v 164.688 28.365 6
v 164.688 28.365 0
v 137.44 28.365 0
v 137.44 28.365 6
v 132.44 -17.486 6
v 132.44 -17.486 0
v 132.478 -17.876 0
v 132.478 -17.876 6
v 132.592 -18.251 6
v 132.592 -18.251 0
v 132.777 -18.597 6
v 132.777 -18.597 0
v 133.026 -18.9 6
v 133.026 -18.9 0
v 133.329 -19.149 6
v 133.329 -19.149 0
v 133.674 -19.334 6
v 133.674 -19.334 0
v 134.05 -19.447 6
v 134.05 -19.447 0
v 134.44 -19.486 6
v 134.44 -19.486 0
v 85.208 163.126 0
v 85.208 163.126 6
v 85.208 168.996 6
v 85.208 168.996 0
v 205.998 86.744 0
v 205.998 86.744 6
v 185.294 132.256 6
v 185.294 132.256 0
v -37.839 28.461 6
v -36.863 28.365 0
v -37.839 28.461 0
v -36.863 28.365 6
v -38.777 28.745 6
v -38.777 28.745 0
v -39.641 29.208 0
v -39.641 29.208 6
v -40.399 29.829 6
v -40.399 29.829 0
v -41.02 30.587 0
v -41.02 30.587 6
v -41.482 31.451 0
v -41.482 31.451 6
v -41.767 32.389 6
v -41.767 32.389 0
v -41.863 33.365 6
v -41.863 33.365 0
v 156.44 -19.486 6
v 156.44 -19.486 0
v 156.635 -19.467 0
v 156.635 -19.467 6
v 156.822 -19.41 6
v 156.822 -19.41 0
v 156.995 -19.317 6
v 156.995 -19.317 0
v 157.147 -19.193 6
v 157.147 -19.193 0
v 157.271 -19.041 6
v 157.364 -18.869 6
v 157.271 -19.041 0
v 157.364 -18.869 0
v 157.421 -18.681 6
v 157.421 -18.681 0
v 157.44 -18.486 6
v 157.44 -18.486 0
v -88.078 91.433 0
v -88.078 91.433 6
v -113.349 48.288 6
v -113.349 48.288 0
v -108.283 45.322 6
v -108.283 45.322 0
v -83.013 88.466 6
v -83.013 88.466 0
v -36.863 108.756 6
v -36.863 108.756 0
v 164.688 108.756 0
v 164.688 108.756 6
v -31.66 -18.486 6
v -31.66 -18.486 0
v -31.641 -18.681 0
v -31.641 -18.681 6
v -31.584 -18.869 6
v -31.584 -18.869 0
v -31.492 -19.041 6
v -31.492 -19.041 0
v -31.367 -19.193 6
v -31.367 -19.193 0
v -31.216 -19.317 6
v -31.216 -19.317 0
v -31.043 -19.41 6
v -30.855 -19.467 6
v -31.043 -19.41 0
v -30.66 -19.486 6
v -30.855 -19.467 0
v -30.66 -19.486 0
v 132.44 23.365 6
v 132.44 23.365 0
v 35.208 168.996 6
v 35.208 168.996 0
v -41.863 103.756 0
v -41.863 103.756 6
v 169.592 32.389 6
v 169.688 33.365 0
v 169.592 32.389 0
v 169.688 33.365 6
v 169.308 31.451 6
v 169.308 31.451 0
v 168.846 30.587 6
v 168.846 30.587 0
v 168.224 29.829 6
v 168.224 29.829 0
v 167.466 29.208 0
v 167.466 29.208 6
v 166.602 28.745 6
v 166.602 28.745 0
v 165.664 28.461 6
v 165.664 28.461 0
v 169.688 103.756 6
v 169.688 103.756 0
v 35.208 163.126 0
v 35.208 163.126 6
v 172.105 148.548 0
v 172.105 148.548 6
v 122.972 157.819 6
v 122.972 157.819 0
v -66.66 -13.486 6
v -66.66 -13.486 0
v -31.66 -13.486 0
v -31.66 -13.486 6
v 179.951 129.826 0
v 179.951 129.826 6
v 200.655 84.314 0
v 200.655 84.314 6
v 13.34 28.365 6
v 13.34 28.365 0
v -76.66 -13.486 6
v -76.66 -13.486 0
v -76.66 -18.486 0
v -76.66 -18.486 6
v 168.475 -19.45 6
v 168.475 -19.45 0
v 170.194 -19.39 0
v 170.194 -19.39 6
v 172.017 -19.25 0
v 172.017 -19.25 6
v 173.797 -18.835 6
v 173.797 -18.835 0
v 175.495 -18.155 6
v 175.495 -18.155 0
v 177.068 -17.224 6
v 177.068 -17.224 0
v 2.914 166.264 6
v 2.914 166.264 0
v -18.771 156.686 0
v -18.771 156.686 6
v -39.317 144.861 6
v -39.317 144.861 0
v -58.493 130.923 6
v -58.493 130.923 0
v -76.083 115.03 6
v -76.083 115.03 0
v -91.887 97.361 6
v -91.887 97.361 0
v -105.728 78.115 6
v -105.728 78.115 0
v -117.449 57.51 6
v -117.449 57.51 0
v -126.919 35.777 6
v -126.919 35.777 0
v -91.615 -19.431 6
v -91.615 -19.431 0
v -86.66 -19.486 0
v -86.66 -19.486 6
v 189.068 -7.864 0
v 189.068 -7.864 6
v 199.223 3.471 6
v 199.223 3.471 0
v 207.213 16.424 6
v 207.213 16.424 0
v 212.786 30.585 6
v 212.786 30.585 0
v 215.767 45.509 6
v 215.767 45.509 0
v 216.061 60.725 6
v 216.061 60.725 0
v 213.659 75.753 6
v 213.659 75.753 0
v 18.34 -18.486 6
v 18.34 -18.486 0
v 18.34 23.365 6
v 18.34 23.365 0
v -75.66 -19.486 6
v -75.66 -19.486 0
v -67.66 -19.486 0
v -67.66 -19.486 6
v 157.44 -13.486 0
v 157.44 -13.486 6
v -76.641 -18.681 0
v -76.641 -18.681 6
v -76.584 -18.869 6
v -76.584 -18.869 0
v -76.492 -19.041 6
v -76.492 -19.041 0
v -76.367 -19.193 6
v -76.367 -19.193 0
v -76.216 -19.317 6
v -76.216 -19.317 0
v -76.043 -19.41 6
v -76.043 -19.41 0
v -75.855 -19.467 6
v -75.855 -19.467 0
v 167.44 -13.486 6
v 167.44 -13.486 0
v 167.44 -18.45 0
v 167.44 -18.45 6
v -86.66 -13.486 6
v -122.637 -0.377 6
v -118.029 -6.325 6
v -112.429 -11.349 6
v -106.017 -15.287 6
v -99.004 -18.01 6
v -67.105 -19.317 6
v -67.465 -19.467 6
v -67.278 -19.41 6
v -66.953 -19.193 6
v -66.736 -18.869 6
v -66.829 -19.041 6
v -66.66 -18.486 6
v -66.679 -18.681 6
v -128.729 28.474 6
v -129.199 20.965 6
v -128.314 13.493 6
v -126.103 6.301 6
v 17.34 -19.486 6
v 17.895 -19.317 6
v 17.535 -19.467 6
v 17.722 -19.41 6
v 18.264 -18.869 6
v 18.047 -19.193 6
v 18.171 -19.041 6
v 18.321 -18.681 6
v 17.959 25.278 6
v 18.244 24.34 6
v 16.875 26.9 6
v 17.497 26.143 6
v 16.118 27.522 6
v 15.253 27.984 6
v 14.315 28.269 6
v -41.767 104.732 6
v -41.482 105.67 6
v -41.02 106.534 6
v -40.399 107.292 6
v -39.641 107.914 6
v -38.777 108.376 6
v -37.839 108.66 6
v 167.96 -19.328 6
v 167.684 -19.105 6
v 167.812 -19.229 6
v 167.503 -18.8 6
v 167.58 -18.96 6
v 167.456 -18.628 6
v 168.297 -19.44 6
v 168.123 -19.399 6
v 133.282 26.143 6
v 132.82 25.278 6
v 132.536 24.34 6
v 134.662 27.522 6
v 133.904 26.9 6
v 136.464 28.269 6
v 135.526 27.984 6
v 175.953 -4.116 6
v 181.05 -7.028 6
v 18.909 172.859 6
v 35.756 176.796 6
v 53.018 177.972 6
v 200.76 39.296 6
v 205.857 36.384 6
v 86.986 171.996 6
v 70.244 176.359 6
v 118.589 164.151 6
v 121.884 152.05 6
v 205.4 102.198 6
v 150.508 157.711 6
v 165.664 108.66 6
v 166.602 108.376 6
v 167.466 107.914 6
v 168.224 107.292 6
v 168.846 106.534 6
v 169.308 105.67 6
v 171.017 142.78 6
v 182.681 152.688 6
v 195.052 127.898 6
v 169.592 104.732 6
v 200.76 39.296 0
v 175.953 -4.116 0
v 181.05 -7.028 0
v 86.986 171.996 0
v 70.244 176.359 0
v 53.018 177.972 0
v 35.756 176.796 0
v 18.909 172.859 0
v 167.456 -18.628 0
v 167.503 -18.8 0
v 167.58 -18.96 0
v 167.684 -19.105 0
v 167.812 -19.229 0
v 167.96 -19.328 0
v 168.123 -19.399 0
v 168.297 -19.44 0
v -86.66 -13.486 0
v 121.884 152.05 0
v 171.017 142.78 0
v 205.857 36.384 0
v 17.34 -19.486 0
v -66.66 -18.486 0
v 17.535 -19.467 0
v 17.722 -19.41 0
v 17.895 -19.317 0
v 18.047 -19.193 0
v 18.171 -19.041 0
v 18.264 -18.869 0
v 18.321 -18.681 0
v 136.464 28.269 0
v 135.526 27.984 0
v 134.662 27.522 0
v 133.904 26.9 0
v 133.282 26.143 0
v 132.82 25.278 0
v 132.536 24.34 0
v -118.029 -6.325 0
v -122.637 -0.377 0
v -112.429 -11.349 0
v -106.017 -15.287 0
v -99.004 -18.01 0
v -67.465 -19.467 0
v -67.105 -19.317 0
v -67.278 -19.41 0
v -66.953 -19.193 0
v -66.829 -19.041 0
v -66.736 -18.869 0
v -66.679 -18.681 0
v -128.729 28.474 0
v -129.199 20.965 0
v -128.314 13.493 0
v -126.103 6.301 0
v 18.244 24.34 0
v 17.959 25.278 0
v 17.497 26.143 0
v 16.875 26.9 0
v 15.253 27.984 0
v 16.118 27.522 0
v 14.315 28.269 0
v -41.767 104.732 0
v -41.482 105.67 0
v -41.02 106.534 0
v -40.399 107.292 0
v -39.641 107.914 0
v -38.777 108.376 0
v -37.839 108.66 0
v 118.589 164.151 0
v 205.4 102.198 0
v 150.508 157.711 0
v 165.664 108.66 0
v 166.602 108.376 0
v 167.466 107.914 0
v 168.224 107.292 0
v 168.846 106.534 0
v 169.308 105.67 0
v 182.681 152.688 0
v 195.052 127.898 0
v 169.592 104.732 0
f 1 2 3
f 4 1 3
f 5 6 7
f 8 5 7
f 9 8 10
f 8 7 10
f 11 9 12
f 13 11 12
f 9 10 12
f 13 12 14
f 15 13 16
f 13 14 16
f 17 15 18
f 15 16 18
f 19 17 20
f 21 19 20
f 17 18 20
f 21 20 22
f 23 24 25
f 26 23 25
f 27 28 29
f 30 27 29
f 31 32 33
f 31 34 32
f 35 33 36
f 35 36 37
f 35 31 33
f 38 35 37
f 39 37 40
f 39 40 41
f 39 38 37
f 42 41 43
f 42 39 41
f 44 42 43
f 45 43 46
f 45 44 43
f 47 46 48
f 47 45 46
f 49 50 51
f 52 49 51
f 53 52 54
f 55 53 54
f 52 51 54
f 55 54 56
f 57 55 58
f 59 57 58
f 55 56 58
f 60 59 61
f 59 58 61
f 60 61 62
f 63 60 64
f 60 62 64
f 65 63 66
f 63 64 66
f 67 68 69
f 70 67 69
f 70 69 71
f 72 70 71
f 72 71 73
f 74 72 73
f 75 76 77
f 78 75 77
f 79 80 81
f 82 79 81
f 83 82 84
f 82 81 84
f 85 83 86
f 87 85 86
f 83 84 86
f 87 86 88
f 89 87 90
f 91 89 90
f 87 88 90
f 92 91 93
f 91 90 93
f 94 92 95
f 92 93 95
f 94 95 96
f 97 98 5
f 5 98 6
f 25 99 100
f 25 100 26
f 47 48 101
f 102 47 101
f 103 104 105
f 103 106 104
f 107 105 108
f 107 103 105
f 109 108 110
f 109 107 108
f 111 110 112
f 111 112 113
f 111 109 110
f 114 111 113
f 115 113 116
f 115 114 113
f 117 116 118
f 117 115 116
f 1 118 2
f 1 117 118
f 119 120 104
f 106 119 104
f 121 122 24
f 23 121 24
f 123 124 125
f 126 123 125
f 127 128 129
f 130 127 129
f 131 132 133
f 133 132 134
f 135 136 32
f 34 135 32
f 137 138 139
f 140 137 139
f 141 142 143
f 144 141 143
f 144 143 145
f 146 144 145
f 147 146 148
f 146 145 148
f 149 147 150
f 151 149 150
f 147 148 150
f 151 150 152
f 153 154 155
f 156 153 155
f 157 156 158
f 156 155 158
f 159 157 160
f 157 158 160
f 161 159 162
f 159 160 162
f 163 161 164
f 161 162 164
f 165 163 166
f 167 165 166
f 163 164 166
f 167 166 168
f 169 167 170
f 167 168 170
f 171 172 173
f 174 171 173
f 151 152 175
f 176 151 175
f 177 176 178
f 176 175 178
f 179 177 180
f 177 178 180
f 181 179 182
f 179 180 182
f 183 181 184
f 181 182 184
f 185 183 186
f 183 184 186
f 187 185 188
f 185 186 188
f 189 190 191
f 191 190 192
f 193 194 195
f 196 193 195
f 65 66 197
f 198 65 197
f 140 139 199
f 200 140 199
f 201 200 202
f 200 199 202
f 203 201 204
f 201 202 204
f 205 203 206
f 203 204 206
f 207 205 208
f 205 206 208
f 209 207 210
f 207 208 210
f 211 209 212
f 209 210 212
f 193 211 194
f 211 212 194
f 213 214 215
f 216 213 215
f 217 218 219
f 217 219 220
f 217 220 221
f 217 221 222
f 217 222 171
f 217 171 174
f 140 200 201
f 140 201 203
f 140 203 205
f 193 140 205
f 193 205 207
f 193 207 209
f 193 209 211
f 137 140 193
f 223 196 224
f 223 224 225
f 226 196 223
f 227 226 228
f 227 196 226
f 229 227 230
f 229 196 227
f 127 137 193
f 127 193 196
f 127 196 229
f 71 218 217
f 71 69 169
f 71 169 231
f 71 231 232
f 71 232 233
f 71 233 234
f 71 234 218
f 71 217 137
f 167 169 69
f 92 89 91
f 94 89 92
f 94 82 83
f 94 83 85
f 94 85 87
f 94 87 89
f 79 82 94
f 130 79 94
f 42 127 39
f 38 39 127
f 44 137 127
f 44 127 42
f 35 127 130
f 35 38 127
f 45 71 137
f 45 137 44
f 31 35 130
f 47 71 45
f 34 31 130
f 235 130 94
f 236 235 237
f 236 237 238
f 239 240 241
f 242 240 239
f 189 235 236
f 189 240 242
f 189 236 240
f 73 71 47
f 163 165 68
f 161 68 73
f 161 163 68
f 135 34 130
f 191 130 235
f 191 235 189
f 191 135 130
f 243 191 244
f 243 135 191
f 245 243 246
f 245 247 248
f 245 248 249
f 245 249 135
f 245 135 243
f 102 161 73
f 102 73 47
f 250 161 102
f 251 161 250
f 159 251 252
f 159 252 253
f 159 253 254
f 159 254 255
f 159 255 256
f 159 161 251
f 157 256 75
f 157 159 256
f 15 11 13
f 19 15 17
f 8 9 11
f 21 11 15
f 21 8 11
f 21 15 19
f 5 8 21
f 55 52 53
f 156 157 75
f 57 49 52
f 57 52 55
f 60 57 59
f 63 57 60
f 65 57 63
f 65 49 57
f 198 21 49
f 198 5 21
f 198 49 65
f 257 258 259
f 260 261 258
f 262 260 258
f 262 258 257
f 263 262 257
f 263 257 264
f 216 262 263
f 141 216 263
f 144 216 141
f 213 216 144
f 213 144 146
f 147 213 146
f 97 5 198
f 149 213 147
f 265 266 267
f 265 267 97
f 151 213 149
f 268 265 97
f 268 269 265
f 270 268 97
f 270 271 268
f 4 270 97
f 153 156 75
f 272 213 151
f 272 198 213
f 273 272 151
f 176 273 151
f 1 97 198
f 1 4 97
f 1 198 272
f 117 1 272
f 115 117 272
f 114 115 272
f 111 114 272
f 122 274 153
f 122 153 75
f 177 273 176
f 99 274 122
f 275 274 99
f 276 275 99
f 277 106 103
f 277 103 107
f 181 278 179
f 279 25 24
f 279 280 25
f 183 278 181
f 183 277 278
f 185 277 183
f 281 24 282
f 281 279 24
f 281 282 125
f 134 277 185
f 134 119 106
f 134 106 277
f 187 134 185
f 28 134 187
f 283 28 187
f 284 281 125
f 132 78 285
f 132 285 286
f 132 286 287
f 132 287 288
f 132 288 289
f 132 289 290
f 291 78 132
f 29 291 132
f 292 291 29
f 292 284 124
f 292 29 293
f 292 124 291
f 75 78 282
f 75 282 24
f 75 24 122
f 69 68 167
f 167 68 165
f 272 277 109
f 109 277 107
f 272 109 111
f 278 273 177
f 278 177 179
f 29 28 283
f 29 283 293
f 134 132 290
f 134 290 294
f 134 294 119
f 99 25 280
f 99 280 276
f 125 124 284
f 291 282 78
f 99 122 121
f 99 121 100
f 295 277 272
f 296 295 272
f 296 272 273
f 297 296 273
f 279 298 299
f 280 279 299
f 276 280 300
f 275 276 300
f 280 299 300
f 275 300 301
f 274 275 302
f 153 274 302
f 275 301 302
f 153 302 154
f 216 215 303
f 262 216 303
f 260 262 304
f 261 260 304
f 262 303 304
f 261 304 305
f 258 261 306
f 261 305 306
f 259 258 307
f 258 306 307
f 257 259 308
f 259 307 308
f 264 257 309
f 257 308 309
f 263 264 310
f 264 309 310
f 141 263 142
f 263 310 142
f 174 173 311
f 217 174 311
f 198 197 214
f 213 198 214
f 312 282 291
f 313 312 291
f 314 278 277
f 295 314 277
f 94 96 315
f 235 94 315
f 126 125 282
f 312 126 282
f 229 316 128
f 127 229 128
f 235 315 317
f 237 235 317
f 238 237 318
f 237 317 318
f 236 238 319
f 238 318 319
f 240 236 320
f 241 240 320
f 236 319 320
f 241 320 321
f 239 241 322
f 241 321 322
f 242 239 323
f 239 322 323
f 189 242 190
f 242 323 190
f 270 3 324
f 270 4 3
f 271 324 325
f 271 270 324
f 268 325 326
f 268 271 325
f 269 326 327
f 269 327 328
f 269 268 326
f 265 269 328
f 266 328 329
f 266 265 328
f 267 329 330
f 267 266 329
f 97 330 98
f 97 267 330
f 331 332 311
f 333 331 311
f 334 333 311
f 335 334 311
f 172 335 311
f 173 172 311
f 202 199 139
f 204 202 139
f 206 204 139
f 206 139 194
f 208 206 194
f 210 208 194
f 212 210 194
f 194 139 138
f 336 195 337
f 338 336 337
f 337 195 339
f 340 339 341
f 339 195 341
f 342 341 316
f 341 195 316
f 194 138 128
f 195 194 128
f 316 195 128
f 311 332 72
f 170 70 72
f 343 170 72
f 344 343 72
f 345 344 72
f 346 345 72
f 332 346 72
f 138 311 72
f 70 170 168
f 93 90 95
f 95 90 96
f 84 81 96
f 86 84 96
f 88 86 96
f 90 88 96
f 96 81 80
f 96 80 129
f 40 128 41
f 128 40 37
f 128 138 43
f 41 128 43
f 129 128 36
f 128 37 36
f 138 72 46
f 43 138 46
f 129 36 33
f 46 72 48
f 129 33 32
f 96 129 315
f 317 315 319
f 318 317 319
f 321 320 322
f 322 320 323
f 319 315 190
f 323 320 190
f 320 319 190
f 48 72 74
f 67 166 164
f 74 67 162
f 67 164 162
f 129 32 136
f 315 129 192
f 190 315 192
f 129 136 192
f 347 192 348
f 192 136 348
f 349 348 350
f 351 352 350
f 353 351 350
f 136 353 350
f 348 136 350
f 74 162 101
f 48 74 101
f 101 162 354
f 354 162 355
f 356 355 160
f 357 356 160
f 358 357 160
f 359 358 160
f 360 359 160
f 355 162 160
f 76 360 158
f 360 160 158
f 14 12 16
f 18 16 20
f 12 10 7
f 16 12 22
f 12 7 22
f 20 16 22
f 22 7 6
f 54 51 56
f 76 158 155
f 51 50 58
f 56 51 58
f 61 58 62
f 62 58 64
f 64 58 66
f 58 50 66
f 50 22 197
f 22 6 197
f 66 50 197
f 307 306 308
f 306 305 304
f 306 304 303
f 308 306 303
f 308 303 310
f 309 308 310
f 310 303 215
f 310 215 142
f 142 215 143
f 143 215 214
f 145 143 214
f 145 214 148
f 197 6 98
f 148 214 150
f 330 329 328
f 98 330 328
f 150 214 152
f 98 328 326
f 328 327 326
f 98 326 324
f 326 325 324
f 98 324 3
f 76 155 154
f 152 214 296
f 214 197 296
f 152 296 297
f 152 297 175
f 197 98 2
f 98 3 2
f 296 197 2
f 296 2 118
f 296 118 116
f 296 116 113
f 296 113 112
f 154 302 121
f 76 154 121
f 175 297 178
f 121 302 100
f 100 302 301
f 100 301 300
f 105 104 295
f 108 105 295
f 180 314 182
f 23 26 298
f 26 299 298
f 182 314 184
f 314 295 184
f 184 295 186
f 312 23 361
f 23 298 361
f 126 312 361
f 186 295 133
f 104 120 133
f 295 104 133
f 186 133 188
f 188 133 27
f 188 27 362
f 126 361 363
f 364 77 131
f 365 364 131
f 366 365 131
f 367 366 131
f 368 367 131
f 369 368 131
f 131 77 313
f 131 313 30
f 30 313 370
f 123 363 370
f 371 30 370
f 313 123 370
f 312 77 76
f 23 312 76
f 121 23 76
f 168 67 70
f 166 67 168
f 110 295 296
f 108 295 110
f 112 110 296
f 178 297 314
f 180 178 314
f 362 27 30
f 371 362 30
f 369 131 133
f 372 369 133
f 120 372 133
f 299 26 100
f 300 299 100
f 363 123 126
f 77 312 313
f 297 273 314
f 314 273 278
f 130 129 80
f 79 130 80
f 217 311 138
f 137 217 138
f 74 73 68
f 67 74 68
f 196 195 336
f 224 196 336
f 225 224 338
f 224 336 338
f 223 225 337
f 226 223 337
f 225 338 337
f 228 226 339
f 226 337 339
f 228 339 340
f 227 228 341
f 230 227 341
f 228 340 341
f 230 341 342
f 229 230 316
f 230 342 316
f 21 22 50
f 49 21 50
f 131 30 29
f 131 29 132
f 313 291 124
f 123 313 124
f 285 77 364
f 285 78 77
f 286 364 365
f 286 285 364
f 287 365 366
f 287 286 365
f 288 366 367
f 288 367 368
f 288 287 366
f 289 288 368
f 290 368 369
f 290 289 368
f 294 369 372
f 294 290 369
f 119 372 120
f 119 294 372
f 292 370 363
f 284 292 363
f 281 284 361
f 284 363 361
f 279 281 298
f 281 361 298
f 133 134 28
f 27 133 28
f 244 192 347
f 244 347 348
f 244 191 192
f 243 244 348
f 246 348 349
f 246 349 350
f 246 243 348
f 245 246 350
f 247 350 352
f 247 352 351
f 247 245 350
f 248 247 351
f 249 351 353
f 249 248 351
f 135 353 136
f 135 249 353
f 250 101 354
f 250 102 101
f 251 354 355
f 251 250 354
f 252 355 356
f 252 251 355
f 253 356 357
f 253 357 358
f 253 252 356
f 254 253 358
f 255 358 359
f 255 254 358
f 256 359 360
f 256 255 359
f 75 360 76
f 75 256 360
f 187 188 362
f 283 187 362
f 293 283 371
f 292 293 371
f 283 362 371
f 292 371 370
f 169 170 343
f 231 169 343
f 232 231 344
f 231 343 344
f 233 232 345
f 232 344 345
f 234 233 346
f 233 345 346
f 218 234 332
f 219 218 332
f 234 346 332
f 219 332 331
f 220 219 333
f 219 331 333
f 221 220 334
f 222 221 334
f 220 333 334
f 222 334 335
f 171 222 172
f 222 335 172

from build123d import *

# Parameters (mm, degrees)
F1_DEPTH = 6
F2_R     = 5
F3_W     = 50
F3_H     = 5.87
F4_DEPTH = 25


with BuildPart() as f1:
    # F0 (on Top) → F1 (new body)
    with BuildSketch(Plane.XY):
        with BuildLine():
            ThreePointArc((170.193543, -19.389994), (173.797456, -18.835445), (177.068441, -17.224121))
            ThreePointArc((177.068441, -17.224121), (210.314706, 23.380525), (213.658845, 75.752924))
            ThreePointArc((213.658845, 75.752924), (200.483313, 115.151894), (182.680857, 152.687823))
            ThreePointArc((182.680857, 152.687823), (134.513109, 160.754816), (86.985857, 171.996198))
            ThreePointArc((86.985857, 171.996198), (44.36332, 177.732663), (2.913726, 166.264491))
            ThreePointArc((2.913726, 166.264491), (-76.082674, 115.030345), (-126.918851, 35.777256))
            ThreePointArc((-126.918851, 35.777256), (-122.637212, -0.376763), (-91.614817, -19.430806))
            Line((-91.614817, -19.430806), (-86.660196, -19.485899))
            Line((-86.660196, -19.485899), (-86.660196, -13.485899))
            Line((-86.660196, -13.485899), (-76.660196, -13.485899))
            Line((-76.660196, -13.485899), (-76.660196, -18.485899))
            ThreePointArc((-76.660196, -18.485899), (-76.367303, -19.193006), (-75.660196, -19.485899))
            Line((-75.660196, -19.485899), (-67.660196, -19.485899))
            ThreePointArc((-67.660196, -19.485899), (-66.953089, -19.193006), (-66.660196, -18.485899))
            Line((-66.660196, -18.485899), (-66.660196, -13.485899))
            Line((-66.660196, -13.485899), (-31.660196, -13.485899))
            Line((-31.660196, -13.485899), (-31.660196, -18.485899))
            ThreePointArc((-31.660196, -18.485899), (-31.367303, -19.193006), (-30.660196, -19.485899))
            Line((-30.660196, -19.485899), (17.339804, -19.485899))
            ThreePointArc((17.339804, -19.485899), (18.046911, -19.193006), (18.339804, -18.485899))
            Line((18.339804, -18.485899), (18.339804, -13.485899))
            Line((18.339804, -13.485899), (18.339804, 28.364893))
            Line((18.339804, 28.364893), (-41.863095, 28.364893))
            Line((-41.863095, 28.364893), (-41.863095, 108.756206))
            Line((-41.863095, 108.756206), (169.688459, 108.756206))
            Line((169.688459, 108.756206), (169.688459, 28.364893))
            Line((169.688459, 28.364893), (132.439804, 28.364893))
            Line((132.439804, 28.364893), (132.439804, -13.485899))
            Line((132.439804, -13.485899), (132.439804, -17.485899))
            ThreePointArc((132.439804, -17.485899), (133.02559, -18.900112), (134.439804, -19.485899))
            Line((134.439804, -19.485899), (156.439804, -19.485899))
            ThreePointArc((156.439804, -19.485899), (157.146911, -19.193006), (157.439804, -18.485899))
            Line((157.439804, -18.485899), (157.439804, -13.485899))
            Line((157.439804, -13.485899), (167.439804, -13.485899))
            Line((167.439804, -13.485899), (167.439804, -18.450465))
            ThreePointArc((167.439804, -18.450465), (167.745112, -19.169773), (168.47461, -19.44986))
            Line((168.47461, -19.44986), (170.193543, -19.389994))
        make_face()
    extrude(amount=F1_DEPTH)

    # F2
    f2_edges = [f1.edges().sort_by_distance(p)[0] for p in [
        (-41.863095, 108.756206, 3),
        (-41.863095, 28.364893, 3),
        (18.339804, 28.364893, 3),
        (169.688459, 108.756206, 3),
        (169.688459, 28.364893, 3),
        (132.439804, 28.364893, 3),
    ]]
    fillet(f2_edges, radius=F2_R)

    # F3 (on face) → F4 (cut)
    with BuildSketch(Plane.XY.offset(6)):
        Polygon((-88.078382, 91.432652), (-113.348544, 48.288487), (-108.283419, 45.32177), (-83.013257, 88.465935), align=None)
        with Locations((60.208148, 166.061319)):
            Rectangle(F3_W, F3_H)
        Polygon((172.10519, 148.548136), (122.972107, 157.818528), (121.883763, 152.050304), (171.016846, 142.779912), align=None)
        Polygon((205.997825, 86.744264), (185.293966, 132.256353), (179.950847, 129.82572), (200.654705, 84.313631), align=None)
        Polygon((175.953445, -4.115971), (181.050032, -7.028307), (205.856984, 36.383847), (200.760397, 39.296184), align=None)
    extrude(amount=-F4_DEPTH, mode=Mode.SUBTRACT)


solid = f1.part
